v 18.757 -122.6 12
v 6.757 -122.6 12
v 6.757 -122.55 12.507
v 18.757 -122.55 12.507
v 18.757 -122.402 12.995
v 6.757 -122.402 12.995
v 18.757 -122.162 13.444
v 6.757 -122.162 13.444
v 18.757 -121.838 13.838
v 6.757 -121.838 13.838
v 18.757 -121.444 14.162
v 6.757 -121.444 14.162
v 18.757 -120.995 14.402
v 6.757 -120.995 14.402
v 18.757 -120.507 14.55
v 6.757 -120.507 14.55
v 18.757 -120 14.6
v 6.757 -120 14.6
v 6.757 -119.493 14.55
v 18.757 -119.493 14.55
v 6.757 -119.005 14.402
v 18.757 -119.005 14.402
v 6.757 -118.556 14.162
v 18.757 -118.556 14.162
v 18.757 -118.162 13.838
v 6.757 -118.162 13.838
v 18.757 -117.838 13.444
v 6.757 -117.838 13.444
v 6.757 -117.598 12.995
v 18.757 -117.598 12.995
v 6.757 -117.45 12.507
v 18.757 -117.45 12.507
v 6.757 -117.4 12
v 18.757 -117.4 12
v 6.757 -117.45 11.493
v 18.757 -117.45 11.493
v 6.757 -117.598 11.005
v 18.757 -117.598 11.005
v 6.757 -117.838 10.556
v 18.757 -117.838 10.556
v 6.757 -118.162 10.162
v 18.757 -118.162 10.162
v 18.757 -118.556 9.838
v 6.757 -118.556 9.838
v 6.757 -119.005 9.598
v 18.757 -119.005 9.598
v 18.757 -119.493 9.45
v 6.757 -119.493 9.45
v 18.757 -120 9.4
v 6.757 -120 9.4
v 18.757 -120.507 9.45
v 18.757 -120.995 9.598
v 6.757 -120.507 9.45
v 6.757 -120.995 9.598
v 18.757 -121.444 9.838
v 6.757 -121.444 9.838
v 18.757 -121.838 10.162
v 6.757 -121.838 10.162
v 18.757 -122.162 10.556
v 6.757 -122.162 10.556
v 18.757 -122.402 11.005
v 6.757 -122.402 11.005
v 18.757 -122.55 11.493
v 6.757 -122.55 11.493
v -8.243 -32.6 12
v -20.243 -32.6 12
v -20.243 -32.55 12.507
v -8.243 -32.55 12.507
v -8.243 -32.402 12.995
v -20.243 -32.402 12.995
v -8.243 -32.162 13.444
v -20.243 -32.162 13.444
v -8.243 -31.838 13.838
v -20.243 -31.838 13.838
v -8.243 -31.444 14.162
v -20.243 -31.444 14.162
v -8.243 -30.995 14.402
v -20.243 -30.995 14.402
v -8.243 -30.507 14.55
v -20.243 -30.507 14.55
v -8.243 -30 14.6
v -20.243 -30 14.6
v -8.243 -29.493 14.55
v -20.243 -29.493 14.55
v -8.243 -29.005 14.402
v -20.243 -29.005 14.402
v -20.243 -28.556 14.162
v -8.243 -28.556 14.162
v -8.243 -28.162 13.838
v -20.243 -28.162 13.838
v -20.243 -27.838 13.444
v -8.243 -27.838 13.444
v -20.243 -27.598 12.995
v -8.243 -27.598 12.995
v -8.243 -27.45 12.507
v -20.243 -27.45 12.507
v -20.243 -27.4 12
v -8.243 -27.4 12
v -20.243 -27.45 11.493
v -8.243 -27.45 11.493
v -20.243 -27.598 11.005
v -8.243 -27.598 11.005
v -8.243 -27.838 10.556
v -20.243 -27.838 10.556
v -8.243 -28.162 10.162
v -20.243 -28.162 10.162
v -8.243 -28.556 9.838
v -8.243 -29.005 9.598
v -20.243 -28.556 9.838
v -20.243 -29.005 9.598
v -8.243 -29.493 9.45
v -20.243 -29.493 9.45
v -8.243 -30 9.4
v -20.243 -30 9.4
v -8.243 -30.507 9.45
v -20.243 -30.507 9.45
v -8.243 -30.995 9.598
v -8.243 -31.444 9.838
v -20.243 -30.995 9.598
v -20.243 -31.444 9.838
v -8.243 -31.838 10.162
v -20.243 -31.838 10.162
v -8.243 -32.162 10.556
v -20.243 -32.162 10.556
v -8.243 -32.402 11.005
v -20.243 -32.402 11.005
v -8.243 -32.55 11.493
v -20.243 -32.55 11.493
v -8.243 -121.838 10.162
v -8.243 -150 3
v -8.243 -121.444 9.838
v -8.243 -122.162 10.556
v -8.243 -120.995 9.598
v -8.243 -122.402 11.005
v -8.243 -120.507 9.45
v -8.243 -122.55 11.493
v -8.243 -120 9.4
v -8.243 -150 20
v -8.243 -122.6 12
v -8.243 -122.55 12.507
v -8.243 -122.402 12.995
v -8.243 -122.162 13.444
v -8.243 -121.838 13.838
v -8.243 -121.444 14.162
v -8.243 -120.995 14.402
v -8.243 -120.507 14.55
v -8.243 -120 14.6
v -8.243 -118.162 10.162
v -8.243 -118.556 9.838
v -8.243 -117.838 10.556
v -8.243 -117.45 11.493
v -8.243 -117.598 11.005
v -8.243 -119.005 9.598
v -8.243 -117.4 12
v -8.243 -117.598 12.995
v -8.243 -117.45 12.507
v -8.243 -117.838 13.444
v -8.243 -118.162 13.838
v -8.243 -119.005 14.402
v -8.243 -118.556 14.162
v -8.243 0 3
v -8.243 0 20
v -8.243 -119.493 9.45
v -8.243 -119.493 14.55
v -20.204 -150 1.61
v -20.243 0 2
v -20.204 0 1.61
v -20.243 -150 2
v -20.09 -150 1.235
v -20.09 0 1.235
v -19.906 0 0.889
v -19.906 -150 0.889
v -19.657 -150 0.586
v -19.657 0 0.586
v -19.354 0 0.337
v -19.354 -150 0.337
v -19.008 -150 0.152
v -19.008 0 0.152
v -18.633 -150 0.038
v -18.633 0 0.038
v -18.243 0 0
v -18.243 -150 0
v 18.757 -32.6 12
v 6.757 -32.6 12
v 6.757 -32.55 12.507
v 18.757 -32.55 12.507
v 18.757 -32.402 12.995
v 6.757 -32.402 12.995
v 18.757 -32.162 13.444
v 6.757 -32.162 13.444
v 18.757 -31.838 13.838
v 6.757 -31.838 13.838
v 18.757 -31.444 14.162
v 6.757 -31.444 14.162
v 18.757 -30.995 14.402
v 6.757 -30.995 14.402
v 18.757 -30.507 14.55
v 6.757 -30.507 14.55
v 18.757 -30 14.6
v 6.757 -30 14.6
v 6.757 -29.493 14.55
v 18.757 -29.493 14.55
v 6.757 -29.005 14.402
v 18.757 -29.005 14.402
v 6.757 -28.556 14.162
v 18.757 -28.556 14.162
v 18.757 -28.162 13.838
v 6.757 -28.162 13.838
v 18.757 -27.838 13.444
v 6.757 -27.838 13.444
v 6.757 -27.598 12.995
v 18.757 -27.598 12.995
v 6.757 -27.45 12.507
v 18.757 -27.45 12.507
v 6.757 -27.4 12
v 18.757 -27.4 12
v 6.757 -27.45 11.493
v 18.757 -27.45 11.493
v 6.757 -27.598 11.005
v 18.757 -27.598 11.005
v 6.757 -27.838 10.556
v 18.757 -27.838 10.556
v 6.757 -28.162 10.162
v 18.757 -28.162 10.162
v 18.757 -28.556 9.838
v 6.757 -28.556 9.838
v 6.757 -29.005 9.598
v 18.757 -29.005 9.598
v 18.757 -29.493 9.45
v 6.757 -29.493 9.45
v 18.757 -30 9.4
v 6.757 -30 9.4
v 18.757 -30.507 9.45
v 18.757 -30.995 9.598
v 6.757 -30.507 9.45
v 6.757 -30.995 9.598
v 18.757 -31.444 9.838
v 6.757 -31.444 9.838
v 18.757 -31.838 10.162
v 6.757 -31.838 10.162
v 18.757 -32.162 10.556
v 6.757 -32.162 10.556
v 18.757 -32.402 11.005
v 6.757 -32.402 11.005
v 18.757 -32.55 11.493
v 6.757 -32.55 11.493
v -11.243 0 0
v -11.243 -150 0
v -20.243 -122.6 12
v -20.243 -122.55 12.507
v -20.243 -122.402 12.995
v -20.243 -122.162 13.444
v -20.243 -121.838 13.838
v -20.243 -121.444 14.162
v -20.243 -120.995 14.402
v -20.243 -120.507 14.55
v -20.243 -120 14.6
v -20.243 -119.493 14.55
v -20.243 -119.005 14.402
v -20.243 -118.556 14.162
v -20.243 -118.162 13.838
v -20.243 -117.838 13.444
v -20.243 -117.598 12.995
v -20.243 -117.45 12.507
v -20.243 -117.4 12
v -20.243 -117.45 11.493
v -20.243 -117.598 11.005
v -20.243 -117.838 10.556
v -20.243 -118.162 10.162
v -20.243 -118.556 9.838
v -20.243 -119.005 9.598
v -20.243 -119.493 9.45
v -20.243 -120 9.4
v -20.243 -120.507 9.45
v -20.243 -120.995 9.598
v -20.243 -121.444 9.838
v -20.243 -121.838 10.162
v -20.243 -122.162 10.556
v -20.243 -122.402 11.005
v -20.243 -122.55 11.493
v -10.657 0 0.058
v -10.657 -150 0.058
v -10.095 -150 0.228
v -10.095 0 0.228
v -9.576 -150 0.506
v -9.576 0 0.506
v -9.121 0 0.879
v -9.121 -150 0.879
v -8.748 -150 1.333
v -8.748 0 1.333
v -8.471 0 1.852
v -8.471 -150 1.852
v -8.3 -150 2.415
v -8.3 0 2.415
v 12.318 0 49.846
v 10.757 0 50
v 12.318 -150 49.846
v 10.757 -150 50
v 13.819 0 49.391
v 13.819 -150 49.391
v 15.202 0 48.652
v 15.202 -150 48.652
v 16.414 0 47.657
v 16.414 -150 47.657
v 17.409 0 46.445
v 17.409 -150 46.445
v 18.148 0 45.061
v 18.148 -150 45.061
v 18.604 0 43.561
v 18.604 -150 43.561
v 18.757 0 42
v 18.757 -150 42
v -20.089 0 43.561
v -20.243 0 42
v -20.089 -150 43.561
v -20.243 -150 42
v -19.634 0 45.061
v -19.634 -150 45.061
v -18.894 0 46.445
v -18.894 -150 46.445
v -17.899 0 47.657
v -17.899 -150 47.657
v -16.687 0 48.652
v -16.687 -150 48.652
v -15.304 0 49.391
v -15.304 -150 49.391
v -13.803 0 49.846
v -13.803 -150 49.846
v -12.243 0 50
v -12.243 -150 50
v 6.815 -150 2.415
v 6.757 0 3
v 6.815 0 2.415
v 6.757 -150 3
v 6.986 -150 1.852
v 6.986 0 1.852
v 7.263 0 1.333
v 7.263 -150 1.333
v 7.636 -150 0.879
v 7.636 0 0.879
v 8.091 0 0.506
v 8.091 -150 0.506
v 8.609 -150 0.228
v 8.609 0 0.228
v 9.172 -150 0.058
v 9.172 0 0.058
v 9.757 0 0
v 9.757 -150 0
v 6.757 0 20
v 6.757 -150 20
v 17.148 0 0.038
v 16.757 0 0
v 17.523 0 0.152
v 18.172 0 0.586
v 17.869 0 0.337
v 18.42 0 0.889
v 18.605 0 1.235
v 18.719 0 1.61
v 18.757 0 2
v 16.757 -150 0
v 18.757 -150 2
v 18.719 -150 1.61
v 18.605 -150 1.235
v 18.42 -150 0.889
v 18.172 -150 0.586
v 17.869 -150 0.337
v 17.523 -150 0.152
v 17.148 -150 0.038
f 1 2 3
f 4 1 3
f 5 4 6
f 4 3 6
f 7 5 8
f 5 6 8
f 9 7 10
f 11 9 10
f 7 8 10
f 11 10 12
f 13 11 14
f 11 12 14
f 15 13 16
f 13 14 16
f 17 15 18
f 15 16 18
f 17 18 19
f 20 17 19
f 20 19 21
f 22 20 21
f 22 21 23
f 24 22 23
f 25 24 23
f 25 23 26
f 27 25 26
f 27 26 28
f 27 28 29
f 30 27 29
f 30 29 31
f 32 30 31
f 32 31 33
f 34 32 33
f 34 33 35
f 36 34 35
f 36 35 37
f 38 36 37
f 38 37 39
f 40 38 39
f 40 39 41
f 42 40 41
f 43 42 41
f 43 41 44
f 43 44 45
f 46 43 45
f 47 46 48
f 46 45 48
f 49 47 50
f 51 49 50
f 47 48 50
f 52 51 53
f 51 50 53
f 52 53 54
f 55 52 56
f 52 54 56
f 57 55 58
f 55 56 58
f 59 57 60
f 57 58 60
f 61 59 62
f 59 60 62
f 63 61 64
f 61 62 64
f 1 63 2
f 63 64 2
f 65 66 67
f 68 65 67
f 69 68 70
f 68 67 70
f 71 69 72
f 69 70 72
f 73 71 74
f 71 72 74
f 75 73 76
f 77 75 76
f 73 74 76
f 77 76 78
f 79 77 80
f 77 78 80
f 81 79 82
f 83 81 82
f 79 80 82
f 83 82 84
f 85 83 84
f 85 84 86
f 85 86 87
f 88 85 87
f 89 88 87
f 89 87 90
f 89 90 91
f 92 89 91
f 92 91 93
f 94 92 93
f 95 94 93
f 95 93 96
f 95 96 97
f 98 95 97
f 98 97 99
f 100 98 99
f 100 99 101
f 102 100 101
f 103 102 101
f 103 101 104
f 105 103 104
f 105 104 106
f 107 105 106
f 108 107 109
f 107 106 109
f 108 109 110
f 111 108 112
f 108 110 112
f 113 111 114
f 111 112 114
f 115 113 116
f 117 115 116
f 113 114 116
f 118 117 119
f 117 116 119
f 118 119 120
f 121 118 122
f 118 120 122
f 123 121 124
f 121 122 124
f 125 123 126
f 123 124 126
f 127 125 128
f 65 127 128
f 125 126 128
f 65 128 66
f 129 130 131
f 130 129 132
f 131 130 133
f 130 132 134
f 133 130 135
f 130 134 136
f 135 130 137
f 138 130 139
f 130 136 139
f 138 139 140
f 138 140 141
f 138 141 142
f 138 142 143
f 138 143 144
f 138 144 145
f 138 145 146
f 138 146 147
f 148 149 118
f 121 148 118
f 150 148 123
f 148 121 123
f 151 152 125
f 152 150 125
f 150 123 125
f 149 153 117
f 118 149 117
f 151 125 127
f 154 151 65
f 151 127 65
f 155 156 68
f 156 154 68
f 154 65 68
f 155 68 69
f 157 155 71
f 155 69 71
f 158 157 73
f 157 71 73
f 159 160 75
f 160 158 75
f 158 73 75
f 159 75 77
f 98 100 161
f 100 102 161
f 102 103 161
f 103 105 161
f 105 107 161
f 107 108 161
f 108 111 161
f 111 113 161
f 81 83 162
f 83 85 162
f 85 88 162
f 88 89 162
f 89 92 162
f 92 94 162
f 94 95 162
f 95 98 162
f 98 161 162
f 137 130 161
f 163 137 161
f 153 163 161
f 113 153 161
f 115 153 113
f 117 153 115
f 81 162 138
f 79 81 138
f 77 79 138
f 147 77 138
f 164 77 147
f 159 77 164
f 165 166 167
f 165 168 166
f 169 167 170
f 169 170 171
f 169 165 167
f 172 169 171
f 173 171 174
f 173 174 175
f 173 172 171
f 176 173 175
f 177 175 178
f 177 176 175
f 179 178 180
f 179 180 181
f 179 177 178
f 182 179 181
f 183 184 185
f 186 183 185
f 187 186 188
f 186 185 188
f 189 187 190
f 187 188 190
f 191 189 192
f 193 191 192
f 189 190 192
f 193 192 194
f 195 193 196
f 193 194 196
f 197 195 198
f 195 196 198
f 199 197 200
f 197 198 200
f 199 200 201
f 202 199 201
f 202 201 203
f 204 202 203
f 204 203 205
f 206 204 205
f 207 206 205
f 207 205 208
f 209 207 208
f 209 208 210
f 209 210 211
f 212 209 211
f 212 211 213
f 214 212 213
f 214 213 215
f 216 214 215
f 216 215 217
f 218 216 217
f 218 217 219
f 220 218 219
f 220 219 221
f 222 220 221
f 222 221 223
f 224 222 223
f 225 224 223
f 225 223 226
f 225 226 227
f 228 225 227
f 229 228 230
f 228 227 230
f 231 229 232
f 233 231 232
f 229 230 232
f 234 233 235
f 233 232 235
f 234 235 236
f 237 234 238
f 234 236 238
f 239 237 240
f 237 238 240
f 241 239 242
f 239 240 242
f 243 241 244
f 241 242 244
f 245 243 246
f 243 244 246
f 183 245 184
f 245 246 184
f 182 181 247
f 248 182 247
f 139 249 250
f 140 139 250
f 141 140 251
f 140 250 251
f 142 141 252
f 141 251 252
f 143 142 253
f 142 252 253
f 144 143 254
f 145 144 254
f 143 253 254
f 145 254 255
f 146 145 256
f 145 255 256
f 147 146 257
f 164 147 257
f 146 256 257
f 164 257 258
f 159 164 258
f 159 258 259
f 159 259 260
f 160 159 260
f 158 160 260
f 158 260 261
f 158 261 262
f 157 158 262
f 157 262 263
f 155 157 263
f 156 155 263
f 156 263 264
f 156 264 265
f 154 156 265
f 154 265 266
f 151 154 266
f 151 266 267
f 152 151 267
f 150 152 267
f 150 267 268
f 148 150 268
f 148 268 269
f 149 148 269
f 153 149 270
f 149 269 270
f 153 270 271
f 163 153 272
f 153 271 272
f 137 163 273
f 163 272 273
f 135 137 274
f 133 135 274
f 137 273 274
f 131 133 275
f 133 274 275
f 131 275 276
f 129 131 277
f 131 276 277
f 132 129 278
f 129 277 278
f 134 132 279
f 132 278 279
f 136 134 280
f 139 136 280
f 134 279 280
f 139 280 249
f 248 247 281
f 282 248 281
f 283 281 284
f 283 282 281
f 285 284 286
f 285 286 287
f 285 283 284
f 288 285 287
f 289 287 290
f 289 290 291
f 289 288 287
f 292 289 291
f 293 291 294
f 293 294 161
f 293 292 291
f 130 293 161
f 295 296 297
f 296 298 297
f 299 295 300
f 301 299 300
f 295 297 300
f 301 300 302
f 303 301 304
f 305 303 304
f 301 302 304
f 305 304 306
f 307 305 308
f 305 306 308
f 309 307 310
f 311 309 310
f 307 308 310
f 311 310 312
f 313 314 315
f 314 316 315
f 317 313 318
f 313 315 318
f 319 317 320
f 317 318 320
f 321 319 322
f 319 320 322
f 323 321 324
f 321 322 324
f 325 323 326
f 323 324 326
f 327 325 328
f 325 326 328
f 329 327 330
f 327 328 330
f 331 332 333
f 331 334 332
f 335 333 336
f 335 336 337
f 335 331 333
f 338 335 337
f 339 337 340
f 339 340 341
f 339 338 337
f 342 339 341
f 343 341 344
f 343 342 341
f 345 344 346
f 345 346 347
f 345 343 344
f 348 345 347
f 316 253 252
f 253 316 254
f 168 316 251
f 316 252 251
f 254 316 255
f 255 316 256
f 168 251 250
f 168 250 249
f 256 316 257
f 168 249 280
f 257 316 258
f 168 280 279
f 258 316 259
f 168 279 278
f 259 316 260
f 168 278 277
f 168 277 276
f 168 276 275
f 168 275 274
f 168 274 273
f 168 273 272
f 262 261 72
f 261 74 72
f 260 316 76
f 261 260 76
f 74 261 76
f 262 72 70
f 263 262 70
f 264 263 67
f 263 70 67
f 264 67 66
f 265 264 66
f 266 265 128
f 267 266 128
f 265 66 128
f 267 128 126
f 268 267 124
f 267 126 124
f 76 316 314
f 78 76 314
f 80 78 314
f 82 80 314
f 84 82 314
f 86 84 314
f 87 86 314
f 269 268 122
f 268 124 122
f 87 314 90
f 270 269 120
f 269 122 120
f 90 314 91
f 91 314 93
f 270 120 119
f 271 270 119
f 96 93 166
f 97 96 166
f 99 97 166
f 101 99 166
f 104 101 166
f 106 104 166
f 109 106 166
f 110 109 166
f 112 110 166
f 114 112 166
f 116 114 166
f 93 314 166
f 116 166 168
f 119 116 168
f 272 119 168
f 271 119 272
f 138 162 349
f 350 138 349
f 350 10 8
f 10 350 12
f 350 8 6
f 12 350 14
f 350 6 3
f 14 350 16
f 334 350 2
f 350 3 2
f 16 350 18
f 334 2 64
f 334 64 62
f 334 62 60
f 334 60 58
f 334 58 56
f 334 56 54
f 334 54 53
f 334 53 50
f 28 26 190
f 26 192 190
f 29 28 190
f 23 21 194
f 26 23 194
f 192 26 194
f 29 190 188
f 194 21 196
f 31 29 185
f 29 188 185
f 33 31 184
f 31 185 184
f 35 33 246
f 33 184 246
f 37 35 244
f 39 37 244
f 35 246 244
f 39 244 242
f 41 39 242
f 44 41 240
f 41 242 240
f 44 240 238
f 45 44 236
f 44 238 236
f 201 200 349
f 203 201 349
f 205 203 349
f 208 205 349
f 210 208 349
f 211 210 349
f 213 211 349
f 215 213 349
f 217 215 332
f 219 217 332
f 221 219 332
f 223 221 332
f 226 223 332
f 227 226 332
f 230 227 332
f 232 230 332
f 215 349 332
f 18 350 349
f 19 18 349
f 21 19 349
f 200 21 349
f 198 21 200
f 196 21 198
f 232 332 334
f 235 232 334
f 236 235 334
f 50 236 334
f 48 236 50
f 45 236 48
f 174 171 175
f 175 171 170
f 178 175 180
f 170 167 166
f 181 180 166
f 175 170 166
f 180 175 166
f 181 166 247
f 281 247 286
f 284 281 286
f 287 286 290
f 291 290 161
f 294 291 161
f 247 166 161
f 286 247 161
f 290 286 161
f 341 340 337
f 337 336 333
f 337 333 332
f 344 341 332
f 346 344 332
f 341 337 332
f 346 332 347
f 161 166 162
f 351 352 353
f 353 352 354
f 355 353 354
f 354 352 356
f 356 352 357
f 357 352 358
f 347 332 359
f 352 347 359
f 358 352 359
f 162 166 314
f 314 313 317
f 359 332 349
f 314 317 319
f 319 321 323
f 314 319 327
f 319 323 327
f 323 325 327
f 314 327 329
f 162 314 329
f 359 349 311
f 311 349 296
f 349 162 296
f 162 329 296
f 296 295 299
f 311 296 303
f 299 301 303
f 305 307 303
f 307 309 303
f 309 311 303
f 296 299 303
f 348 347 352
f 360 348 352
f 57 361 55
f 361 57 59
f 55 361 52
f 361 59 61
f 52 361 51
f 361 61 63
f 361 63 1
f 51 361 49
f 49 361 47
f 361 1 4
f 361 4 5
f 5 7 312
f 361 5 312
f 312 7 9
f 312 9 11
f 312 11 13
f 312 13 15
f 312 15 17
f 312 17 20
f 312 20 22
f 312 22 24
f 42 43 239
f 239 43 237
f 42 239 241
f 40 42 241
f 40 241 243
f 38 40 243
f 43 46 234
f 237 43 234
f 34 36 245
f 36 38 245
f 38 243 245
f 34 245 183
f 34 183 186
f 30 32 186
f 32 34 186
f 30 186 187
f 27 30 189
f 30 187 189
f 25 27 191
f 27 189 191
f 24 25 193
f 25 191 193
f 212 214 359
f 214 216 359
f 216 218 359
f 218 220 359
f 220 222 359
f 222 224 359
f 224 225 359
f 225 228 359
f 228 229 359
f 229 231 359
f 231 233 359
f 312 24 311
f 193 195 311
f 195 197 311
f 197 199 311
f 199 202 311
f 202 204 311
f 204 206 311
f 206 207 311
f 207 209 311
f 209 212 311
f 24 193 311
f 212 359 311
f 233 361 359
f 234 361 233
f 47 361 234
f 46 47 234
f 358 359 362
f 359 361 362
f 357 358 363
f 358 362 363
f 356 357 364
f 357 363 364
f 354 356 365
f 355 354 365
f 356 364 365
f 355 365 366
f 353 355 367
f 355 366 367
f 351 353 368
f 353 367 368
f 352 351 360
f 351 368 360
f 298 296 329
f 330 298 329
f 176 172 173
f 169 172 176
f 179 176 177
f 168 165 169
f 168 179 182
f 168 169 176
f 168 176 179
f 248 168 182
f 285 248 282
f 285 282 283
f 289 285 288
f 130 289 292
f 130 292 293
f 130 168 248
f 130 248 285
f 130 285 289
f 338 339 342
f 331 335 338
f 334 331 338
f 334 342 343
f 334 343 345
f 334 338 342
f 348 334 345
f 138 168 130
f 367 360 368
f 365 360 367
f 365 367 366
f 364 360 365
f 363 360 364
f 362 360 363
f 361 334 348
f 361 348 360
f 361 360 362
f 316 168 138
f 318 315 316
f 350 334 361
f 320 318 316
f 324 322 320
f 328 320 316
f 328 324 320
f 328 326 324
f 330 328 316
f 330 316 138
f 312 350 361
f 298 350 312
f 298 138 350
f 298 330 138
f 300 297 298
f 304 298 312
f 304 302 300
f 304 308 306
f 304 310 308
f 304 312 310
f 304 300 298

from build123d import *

# Parameters (mm, degrees)
F1_DEPTH = 150
F2_R     = 3
F3_R     = 8
F4_R     = 2
F5_R     = 2.6
F6_DEPTH = 39


with BuildPart() as f1:
    # F0 (on Front) → F1 (new body)
    with BuildSketch(Plane.XZ):
        Polygon((-20.242574, 50), (-20.242574, 0), (-8.242574, 0), (-8.242574, 20), (6.757426, 20), (6.757426, 0), (18.757426, 0), (18.757426, 50), align=None)
    extrude(amount=F1_DEPTH)

    # F2
    f2_edges = [f1.edges().sort_by_distance(p)[0] for p in [
        (-8.242574, -75, 0),
        (6.757426, -75, 0),
    ]]
    fillet(f2_edges, radius=F2_R)

    # F3
    f3_edges = [f1.edges().sort_by_distance(p)[0] for p in [
        (-20.242574, -75, 50),
        (18.757426, -75, 50),
    ]]
    fillet(f3_edges, radius=F3_R)

    # F4
    f4_edges = [f1.edges().sort_by_distance(p)[0] for p in [
        (18.757426, -75, 0),
        (-20.242574, -75, 0),
    ]]
    fillet(f4_edges, radius=F4_R)

    # F5 (on face) → F6 (cut, through all)
    with BuildSketch(Plane(origin=(-20.242574, 0, 0), x_dir=(0, -1, 0), z_dir=(-1, 0, 0))):
        with Locations((30, 12)):
            Circle(F5_R)
        with Locations((120, 12)):
            Circle(F5_R)
    extrude(amount=-F6_DEPTH, mode=Mode.SUBTRACT)


solid = f1.part
